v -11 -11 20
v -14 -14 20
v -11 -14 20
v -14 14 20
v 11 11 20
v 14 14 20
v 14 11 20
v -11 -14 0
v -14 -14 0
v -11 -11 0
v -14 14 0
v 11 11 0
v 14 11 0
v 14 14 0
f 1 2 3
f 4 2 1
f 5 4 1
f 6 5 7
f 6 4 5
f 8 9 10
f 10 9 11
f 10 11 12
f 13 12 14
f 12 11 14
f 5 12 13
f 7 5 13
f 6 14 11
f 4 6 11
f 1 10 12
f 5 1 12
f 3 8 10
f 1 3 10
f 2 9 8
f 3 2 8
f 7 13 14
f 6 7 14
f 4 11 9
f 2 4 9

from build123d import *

# Parameters (mm, degrees)
EXTRUDE_1_DEPTH = 20


with BuildPart() as part:
    # 草圖1 → 填料-伸長1 (new body)
    with BuildSketch(Plane.XY):
        Polygon((-11, -11), (11, 11), (14, 11), (14, 14), (-14, 14), (-14, -14), (-11, -14), align=None)
    extrude(amount=EXTRUDE_1_DEPTH)


solid = part.part
